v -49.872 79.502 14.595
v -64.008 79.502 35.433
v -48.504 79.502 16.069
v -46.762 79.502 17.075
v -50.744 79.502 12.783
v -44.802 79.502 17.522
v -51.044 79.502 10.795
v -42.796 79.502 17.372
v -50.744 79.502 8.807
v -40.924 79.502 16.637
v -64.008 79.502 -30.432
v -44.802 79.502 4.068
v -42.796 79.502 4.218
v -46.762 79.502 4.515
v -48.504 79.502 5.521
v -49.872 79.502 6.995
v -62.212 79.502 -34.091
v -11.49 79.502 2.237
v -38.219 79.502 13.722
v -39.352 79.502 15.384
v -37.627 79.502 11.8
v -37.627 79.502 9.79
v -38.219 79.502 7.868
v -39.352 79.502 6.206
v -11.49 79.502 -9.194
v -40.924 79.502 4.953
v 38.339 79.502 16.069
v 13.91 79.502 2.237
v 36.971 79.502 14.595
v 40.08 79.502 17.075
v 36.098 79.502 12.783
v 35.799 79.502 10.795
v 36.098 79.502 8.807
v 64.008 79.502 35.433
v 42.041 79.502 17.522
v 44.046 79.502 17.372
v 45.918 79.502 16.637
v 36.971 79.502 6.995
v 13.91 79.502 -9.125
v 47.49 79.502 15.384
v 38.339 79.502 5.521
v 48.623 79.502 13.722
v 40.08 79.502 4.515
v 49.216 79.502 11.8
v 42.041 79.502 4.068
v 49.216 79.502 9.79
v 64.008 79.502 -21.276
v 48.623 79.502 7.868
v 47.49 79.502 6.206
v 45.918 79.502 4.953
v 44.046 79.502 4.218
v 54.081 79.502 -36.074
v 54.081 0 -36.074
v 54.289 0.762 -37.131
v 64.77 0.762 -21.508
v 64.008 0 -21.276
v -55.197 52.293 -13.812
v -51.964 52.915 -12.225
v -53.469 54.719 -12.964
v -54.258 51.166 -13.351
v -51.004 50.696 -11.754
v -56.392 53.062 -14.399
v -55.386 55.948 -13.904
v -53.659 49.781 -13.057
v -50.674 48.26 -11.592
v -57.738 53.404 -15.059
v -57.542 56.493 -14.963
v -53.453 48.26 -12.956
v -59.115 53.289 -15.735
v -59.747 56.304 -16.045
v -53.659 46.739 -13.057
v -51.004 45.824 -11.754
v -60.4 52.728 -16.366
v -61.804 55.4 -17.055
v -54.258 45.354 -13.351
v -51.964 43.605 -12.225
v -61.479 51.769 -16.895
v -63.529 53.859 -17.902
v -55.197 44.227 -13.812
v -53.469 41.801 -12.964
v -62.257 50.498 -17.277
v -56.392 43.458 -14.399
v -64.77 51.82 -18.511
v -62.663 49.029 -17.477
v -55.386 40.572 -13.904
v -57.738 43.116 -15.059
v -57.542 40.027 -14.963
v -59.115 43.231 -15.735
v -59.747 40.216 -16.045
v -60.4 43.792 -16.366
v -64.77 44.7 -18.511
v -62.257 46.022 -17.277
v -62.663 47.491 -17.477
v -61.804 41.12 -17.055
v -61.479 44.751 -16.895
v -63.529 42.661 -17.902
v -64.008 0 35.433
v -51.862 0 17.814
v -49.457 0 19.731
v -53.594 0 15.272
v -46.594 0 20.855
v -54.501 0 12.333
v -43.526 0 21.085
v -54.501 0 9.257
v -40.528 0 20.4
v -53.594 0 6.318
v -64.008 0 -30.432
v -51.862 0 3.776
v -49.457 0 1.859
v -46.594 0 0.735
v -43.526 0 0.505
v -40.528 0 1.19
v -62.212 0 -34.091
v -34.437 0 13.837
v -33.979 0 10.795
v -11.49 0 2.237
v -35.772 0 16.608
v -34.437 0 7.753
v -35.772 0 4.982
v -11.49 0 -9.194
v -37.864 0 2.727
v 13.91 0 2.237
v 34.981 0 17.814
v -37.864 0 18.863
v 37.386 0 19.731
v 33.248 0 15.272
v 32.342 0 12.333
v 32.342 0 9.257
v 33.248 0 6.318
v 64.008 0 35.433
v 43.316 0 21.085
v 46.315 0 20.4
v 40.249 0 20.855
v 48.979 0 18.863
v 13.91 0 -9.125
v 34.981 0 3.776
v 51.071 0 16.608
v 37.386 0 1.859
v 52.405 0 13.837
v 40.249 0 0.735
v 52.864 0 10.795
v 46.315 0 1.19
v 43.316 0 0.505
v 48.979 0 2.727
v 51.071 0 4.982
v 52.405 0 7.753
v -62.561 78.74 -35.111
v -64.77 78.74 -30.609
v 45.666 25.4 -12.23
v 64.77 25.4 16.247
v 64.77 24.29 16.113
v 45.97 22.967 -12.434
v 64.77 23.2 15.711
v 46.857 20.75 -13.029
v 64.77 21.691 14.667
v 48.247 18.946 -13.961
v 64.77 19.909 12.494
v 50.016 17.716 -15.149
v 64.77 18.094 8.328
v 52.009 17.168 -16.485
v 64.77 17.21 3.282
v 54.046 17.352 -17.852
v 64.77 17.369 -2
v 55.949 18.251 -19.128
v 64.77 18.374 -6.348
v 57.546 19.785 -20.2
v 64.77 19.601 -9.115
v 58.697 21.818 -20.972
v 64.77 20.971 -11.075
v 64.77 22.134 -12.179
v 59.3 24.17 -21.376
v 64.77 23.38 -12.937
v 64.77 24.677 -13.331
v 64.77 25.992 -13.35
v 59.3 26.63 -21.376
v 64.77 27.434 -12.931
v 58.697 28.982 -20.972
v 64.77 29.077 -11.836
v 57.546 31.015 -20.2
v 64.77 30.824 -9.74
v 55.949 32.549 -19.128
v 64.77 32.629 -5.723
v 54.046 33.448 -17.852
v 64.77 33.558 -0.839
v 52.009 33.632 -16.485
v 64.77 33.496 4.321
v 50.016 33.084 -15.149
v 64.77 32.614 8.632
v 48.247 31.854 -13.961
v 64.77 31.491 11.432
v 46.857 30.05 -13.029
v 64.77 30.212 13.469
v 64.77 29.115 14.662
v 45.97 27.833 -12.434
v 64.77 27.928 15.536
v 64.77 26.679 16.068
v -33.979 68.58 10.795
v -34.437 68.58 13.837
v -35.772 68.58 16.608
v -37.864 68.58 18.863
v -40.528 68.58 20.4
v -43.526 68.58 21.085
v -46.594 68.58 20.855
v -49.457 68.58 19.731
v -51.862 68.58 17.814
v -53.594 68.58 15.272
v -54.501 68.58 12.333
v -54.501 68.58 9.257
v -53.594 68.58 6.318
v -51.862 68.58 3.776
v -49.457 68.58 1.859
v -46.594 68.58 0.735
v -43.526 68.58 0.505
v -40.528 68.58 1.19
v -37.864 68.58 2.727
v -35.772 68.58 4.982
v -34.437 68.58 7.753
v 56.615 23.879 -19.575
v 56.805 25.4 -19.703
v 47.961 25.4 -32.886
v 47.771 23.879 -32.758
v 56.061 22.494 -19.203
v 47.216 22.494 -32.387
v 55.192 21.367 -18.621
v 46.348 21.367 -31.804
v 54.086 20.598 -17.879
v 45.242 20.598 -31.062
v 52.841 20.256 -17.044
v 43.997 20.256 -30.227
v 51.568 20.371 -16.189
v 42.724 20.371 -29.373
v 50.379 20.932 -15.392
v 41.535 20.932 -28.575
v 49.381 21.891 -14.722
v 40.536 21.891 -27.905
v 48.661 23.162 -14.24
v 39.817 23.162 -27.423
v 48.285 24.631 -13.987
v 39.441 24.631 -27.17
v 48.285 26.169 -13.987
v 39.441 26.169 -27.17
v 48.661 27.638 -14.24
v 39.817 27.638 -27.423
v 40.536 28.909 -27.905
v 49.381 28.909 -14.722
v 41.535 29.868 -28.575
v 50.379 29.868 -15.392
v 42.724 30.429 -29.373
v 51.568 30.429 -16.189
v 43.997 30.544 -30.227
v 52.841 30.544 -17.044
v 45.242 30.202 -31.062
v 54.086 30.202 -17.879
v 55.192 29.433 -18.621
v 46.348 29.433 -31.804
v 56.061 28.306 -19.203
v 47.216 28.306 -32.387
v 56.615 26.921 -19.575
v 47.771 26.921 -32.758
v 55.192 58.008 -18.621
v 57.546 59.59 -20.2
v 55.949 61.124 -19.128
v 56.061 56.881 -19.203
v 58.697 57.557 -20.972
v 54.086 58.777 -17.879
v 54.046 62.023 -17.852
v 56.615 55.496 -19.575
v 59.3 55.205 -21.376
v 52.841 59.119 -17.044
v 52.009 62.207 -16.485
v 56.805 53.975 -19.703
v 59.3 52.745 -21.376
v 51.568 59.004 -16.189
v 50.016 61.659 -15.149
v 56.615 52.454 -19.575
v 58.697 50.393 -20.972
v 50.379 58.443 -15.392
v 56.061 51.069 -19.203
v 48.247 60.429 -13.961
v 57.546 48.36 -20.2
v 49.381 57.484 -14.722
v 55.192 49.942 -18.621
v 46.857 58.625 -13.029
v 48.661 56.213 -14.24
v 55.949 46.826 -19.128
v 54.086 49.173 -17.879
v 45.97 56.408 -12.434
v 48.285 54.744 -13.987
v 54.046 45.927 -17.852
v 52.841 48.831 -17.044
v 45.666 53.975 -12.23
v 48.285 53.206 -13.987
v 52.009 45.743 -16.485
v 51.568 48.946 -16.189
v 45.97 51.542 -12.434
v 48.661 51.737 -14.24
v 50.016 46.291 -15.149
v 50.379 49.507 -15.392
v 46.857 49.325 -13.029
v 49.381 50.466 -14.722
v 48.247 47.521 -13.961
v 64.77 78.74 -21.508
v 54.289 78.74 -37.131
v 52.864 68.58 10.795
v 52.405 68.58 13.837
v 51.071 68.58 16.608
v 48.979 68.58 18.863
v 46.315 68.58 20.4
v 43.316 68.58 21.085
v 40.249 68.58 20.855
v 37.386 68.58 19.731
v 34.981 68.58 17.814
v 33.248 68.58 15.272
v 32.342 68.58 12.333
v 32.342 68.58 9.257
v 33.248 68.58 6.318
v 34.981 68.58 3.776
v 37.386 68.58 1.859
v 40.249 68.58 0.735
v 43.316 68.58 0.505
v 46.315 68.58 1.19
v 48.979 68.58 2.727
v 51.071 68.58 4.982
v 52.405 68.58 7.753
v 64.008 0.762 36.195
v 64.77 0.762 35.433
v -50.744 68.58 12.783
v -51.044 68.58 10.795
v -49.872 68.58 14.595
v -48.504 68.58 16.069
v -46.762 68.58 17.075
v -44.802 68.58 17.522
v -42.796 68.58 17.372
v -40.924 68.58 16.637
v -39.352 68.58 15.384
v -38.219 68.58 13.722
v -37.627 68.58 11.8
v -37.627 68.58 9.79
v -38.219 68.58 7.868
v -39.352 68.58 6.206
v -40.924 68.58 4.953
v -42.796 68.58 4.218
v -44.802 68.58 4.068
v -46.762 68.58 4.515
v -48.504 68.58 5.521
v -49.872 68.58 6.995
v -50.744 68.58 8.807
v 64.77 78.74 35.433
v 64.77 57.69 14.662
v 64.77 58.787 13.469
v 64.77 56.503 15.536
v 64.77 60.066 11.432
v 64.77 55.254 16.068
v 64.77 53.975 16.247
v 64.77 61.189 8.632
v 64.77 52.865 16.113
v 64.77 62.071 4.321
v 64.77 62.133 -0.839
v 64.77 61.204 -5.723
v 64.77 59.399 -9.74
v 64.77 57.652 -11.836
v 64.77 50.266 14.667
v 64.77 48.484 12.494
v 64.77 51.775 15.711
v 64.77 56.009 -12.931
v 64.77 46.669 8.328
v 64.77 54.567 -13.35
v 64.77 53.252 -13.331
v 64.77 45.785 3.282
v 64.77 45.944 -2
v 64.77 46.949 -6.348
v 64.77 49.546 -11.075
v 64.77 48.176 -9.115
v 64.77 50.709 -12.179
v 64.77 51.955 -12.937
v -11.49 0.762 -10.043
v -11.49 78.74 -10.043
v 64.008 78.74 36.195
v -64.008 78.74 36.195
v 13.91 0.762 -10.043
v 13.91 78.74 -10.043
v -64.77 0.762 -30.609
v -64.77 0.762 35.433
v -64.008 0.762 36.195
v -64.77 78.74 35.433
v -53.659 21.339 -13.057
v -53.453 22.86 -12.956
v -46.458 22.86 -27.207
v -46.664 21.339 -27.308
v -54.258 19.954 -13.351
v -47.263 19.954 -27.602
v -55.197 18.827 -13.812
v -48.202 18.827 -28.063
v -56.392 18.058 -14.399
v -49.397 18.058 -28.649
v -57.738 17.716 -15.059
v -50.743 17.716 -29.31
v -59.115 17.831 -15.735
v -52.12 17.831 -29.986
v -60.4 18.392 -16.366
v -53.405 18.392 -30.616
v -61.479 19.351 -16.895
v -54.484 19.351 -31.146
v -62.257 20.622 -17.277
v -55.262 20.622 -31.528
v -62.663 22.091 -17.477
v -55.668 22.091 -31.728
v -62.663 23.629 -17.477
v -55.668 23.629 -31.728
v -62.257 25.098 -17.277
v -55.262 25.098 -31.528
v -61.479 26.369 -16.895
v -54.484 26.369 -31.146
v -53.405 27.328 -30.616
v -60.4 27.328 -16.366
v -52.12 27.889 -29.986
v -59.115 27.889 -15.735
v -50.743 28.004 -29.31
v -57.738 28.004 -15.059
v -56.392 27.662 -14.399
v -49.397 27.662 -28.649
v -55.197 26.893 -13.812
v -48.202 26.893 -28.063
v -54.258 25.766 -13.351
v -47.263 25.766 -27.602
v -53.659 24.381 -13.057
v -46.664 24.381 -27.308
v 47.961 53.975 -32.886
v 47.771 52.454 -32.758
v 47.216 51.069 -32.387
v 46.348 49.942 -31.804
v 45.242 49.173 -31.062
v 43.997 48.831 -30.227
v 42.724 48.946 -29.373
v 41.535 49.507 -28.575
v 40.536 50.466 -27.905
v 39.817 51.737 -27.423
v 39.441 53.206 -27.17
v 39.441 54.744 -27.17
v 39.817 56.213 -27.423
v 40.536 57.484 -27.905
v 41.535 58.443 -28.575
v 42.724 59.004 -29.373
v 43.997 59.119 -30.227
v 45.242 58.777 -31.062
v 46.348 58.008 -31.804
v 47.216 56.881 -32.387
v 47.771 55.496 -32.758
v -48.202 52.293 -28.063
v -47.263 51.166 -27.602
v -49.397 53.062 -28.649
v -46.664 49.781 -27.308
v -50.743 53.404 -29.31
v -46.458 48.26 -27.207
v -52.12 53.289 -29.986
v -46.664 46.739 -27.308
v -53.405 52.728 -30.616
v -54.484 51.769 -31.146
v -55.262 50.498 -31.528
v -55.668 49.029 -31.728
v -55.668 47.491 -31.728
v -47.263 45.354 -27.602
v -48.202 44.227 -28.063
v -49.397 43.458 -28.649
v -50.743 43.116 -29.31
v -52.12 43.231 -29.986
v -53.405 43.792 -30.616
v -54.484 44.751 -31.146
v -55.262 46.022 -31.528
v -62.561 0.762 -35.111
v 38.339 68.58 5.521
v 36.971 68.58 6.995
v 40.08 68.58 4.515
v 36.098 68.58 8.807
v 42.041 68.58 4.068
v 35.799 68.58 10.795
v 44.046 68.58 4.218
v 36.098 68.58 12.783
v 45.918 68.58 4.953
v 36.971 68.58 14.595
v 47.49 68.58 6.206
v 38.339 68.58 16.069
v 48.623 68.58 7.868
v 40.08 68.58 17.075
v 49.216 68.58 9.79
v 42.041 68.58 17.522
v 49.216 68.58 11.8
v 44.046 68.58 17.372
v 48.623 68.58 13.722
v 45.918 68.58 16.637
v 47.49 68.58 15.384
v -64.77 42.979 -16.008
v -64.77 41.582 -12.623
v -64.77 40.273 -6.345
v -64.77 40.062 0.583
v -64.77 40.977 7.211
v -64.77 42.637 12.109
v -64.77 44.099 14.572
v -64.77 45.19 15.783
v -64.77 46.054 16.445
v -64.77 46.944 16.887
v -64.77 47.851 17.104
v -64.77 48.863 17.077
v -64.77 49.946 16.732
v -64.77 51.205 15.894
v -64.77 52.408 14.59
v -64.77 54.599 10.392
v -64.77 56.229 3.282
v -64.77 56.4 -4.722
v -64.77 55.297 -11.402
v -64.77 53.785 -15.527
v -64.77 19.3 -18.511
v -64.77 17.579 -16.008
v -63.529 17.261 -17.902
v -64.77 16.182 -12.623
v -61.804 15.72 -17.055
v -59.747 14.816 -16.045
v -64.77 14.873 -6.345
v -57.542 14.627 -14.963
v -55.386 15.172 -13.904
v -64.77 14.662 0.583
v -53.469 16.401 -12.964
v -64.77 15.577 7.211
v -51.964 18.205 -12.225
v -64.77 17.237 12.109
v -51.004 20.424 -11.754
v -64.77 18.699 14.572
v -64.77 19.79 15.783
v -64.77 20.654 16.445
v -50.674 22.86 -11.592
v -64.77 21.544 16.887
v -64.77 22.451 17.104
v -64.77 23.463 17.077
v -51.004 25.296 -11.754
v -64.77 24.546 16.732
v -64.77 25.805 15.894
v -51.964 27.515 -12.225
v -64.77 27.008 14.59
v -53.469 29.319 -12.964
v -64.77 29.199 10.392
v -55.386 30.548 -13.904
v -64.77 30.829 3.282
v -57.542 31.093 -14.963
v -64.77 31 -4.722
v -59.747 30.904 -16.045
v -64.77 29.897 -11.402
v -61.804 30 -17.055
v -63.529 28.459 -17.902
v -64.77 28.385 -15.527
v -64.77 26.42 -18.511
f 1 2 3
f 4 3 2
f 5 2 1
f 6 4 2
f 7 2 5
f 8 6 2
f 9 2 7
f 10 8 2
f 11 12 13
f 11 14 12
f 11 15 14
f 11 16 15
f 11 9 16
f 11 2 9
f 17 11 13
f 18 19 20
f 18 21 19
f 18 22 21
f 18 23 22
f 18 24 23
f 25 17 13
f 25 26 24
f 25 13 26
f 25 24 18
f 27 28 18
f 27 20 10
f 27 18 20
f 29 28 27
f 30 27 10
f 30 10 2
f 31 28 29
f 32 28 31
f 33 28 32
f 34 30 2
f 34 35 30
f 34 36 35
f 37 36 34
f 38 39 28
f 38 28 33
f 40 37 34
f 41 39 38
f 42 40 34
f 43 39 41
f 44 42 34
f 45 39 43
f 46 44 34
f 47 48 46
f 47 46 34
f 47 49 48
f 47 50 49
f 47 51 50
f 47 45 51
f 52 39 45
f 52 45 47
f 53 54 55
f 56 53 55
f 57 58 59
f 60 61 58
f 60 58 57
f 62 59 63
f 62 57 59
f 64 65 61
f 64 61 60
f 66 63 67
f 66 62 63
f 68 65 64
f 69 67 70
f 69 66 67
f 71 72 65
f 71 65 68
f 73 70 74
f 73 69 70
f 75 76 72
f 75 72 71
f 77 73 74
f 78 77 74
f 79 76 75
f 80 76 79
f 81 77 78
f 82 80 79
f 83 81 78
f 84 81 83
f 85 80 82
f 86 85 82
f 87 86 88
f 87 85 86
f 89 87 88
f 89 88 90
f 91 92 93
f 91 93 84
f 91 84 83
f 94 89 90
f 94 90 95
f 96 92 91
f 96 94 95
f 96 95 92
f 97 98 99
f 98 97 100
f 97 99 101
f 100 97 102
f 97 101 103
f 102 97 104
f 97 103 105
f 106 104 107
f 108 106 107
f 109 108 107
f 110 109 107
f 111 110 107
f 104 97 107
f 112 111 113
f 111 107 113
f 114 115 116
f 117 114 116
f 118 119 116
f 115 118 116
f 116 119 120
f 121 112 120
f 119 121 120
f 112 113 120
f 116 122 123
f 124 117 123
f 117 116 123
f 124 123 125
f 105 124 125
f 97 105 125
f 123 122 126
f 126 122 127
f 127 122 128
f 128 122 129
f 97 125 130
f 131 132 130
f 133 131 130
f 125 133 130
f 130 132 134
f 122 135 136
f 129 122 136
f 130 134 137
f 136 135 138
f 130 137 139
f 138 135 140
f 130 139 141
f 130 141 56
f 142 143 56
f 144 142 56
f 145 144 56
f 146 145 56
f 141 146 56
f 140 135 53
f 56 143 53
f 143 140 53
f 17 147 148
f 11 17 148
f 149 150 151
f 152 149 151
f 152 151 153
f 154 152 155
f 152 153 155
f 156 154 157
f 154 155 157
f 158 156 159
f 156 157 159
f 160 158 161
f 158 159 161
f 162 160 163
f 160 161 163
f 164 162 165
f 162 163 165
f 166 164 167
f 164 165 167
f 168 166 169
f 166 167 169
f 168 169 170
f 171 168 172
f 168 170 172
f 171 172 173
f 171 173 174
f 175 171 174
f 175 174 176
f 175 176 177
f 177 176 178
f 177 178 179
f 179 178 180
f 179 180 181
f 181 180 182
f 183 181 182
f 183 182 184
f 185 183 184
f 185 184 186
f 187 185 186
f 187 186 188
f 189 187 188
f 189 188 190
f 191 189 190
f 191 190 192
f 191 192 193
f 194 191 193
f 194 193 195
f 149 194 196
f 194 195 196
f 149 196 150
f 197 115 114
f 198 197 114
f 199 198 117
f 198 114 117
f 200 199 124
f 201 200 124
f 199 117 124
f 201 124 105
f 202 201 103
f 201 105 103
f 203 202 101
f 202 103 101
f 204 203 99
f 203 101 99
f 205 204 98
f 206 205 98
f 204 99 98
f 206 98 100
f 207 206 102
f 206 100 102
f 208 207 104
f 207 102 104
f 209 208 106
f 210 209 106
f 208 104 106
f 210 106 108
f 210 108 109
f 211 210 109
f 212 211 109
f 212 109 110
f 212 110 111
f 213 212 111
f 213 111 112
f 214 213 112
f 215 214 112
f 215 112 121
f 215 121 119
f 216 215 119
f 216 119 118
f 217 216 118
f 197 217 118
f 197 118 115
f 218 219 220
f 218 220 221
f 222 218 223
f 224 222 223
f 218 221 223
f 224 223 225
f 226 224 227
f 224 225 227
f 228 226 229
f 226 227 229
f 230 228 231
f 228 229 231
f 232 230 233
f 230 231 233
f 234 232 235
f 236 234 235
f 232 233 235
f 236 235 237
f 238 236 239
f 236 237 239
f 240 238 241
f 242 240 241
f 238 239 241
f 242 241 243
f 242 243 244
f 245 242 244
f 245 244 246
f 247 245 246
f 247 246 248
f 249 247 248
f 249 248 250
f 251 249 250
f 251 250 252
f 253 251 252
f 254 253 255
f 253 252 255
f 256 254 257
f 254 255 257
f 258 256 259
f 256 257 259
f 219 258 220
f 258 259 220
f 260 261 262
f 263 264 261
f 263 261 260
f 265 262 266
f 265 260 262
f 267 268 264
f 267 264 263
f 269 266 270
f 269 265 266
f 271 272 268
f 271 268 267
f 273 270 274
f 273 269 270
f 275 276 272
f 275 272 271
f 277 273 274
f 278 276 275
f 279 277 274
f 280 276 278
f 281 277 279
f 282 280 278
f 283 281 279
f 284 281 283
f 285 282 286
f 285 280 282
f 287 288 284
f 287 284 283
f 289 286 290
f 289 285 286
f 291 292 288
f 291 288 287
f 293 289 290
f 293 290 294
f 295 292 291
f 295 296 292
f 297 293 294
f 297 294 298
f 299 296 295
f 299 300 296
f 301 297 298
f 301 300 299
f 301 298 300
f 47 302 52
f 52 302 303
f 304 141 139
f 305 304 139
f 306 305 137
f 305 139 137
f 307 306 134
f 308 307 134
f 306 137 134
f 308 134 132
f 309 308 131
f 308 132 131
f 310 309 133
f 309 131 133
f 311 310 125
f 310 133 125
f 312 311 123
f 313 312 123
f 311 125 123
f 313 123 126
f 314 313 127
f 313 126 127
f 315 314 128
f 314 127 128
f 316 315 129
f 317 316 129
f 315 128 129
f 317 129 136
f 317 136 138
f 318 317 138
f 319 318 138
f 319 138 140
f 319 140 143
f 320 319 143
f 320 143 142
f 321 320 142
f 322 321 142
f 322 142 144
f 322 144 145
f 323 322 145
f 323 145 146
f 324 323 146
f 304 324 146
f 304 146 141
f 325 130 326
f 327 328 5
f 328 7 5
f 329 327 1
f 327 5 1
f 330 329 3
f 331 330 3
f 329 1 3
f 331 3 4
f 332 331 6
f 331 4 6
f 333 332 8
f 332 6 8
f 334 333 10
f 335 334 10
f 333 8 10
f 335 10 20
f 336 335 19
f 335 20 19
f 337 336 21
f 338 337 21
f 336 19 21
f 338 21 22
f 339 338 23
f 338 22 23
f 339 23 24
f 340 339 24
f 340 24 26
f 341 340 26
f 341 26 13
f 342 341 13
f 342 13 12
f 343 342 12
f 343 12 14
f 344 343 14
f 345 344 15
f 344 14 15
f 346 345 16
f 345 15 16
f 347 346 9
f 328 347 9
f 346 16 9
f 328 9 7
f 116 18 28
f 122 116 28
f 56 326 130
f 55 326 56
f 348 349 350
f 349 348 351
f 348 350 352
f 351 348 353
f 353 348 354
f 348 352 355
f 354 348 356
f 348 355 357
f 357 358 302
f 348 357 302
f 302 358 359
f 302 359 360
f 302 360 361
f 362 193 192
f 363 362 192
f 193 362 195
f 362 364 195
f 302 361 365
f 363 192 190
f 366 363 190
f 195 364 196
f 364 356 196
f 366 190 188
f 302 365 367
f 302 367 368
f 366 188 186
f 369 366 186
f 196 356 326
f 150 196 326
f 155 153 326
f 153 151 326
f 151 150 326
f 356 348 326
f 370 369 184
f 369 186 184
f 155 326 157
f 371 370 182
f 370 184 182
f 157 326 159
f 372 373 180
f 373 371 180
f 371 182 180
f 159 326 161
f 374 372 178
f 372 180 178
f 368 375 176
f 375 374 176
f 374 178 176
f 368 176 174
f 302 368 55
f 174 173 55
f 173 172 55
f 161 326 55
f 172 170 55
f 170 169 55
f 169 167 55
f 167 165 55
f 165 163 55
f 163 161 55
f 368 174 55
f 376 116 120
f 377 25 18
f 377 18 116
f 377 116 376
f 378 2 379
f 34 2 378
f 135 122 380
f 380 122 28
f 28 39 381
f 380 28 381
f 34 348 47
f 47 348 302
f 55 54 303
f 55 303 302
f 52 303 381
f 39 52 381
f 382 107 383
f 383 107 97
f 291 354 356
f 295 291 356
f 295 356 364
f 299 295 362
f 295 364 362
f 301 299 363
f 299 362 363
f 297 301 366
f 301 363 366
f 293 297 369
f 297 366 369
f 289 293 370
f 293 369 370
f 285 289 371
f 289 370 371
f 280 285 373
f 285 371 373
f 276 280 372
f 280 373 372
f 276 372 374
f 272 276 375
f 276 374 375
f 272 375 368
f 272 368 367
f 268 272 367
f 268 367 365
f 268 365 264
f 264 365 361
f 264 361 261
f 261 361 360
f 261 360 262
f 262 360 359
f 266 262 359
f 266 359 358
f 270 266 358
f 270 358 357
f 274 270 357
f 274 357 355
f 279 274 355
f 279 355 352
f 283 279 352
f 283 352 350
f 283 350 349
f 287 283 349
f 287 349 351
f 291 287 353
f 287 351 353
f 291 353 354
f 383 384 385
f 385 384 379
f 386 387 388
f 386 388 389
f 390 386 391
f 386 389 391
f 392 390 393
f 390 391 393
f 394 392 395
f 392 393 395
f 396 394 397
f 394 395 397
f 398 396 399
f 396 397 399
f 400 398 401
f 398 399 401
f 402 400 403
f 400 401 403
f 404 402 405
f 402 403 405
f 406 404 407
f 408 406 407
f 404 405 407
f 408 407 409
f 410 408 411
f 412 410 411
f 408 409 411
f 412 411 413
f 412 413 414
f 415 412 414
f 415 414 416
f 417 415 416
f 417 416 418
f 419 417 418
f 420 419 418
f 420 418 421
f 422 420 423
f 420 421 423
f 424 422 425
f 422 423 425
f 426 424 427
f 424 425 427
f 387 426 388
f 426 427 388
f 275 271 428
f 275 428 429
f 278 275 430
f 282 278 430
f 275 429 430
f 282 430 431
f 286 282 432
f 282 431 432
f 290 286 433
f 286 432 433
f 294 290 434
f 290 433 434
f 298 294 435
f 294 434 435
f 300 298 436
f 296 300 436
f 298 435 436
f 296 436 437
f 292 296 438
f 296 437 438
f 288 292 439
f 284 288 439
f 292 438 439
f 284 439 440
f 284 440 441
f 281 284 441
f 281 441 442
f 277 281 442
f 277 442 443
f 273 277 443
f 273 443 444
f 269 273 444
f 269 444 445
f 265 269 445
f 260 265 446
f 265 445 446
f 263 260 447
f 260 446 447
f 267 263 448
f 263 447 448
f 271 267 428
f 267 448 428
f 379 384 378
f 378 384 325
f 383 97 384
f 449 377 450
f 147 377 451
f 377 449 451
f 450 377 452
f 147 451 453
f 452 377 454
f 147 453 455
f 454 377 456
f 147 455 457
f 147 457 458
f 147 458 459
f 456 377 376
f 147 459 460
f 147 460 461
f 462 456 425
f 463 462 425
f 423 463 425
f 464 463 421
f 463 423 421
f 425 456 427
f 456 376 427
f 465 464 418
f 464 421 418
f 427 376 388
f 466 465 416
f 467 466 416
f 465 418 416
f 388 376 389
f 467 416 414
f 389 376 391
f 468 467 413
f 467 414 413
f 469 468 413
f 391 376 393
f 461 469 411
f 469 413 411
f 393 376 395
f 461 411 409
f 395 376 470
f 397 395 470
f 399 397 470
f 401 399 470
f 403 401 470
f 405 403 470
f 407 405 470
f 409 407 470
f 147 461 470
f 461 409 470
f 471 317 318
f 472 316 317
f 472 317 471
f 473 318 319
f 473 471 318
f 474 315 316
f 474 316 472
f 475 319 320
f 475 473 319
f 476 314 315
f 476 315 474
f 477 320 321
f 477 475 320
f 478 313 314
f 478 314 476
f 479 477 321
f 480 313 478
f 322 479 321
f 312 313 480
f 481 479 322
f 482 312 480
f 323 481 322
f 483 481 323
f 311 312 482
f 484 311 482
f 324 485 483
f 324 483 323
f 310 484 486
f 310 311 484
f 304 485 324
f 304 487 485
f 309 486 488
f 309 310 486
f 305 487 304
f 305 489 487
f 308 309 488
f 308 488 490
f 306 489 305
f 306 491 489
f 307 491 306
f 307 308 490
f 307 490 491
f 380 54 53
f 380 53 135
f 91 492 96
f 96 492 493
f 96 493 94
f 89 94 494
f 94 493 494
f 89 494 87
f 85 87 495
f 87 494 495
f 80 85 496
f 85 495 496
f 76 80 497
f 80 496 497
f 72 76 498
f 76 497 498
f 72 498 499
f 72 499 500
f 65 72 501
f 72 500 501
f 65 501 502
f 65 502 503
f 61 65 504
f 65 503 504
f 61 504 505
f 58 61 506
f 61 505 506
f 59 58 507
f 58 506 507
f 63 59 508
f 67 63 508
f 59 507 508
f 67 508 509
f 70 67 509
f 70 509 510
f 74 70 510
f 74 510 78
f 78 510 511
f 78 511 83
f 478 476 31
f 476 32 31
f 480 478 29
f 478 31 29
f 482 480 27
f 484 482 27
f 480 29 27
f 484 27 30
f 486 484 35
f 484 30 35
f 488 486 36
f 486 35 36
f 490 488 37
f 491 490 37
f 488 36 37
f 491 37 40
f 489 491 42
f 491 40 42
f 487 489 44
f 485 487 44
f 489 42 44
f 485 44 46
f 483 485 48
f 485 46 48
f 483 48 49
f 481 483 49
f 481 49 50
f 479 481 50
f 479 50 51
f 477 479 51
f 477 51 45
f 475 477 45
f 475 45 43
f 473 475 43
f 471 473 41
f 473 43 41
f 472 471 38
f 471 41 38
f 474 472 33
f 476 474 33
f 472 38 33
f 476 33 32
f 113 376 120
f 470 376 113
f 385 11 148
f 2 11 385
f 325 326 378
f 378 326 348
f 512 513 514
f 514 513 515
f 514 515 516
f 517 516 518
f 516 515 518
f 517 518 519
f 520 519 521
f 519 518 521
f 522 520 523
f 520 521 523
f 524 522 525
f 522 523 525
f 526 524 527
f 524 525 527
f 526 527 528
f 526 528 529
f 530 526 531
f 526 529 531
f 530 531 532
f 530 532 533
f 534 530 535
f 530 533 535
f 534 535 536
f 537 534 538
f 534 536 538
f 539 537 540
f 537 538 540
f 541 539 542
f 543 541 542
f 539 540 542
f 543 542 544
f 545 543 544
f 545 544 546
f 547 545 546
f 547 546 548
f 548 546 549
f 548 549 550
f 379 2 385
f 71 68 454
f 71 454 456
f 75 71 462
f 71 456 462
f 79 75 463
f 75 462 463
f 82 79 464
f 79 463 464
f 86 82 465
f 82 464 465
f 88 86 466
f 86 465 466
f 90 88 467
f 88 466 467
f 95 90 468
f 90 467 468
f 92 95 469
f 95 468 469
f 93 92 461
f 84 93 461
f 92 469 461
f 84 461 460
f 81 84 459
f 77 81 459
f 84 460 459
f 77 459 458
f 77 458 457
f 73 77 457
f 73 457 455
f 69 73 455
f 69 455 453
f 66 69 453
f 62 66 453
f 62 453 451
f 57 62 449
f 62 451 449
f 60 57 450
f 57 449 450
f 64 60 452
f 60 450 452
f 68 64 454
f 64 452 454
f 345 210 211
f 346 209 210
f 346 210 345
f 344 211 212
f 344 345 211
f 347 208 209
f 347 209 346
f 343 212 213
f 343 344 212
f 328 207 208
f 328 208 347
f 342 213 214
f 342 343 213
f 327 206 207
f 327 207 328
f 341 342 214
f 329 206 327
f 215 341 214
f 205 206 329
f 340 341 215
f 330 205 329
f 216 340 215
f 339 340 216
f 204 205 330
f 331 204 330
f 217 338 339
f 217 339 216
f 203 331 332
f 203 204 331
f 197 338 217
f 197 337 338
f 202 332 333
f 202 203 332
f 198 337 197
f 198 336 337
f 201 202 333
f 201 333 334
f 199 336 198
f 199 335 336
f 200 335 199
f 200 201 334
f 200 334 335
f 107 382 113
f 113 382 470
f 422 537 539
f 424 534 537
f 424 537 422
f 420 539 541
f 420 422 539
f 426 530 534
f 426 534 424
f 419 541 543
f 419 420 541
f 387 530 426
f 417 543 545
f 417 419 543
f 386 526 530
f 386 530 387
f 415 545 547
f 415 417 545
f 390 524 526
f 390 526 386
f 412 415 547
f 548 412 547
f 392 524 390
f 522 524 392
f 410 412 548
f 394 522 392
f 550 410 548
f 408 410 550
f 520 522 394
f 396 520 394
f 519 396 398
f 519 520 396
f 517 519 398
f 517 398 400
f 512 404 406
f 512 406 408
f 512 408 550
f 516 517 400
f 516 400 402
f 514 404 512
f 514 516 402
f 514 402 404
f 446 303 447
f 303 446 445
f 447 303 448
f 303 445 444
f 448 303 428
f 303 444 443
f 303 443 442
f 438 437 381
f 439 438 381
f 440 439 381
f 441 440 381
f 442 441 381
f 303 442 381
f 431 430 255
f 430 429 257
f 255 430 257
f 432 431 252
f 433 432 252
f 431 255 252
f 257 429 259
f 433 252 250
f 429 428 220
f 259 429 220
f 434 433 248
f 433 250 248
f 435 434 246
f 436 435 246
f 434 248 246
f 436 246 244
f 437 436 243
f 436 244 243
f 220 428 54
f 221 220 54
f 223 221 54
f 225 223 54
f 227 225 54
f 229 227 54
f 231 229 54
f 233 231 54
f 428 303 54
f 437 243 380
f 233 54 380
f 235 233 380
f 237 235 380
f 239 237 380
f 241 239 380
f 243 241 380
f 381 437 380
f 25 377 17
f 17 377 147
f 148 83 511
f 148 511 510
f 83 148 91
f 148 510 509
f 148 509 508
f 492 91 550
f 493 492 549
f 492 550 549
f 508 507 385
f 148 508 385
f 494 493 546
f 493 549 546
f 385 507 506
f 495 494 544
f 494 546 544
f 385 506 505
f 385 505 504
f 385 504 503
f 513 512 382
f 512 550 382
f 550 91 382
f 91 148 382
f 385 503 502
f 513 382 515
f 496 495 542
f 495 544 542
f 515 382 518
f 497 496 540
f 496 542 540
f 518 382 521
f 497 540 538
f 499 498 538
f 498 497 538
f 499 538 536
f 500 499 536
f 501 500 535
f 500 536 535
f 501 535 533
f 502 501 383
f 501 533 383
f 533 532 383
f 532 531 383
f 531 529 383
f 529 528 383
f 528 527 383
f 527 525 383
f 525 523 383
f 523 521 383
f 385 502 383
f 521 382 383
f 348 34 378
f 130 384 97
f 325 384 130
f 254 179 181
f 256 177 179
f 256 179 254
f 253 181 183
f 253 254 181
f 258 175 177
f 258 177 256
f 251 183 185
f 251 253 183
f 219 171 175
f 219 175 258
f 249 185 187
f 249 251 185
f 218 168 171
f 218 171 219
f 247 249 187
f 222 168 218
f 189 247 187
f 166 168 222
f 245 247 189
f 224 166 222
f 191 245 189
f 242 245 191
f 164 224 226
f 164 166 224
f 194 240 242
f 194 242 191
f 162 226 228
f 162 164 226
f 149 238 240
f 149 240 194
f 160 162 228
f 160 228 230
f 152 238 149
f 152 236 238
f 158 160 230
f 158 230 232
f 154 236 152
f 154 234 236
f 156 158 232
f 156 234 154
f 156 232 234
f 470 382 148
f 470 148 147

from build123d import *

# Parameters (mm, degrees)
EXTRUDE1_DEPTH                                   = 79.502
CBORE_FOR_3_8_SOCKET_HEAD_CAP_SCREW1_D           = 10.31748
CBORE_FOR_3_8_SOCKET_HEAD_CAP_SCREW1_CBORE_D     = 16.51
CBORE_FOR_3_8_SOCKET_HEAD_CAP_SCREW1_CBORE_DEPTH = 50.165
CBORE_FOR_3_8_SOCKET_HEAD_CAP_SCREW2_D           = 10.31748
CBORE_FOR_3_8_SOCKET_HEAD_CAP_SCREW2_CBORE_D     = 16.51
CBORE_FOR_3_8_SOCKET_HEAD_CAP_SCREW2_CBORE_DEPTH = 50.165
SKETCH14_W                                       = 25.4
SKETCH14_H                                       = 12.279702398
EXTRUDE2_DEPTH                                   = 80.502
CBORE_FOR_1_2_SOCKET_HEAD_CAP_SCREW1_D           = 13.49248
CBORE_FOR_1_2_SOCKET_HEAD_CAP_SCREW1_CBORE_D     = 20.6375
CBORE_FOR_1_2_SOCKET_HEAD_CAP_SCREW1_CBORE_DEPTH = 68.58
EXTRUDE3_DEPTH                                   = 80.502
CHAMFER1_SIZE                                    = 0.762


with BuildPart() as part:
    # Sketch1 → Extrude1 (new body)
    with BuildSketch(Plane(origin=(0, 0, 0), x_dir=(1, 0, 0), z_dir=(0, 1, 0))):
        Polygon((-64.77, 36.195), (-64.77, -36.195), (64.77, -36.195), (64.77, 44.162668668), (3.17795769, 2.843029897), align=None)
    extrude(amount=EXTRUDE1_DEPTH)

    # CBORE for 3/8 Socket Head Cap Screw1 (through all)
    with Locations(Plane(origin=(-27.357474291, 0, 55.735373351), x_dir=(-0.897690082, 0, -0.440627412), z_dir=(-0.440627412, 0, 0.897690082))):
        with Locations((58.851895807, -48.26), (58.851895807, -22.86)):
            CounterBoreHole(CBORE_FOR_3_8_SOCKET_HEAD_CAP_SCREW1_D / 2, CBORE_FOR_3_8_SOCKET_HEAD_CAP_SCREW1_CBORE_D / 2, CBORE_FOR_3_8_SOCKET_HEAD_CAP_SCREW1_CBORE_DEPTH)

    # CBORE for 3/8 Socket Head Cap Screw2 (through all)
    with Locations(Plane(origin=(36.462488364, 0, 54.351857685), x_dir=(-0.830439574, 0, 0.55710871), z_dir=(0.55710871, 0, 0.830439574))):
        with Locations((-52.990978547, -25.4), (-52.990978547, -53.975)):
            CounterBoreHole(CBORE_FOR_3_8_SOCKET_HEAD_CAP_SCREW2_D / 2, CBORE_FOR_3_8_SOCKET_HEAD_CAP_SCREW2_CBORE_D / 2, CBORE_FOR_3_8_SOCKET_HEAD_CAP_SCREW2_CBORE_DEPTH)

    # Sketch14 → Extrude2 (cut, through all)
    with BuildSketch(Plane(origin=(0, 79.502, 0), x_dir=(1, 0, 0), z_dir=(0, 1, 0))):
        with Locations((1.21000637, 3.902881096)):
            Rectangle(SKETCH14_W, SKETCH14_H)
    extrude(amount=-EXTRUDE2_DEPTH, mode=Mode.SUBTRACT)

    # CBORE for 1/2 Socket Head Cap Screw1 (through all)
    with Locations(Plane.XZ):
        with Locations((-44.2976, 10.795), (42.545, 10.795)):
            CounterBoreHole(CBORE_FOR_1_2_SOCKET_HEAD_CAP_SCREW1_D / 2, CBORE_FOR_1_2_SOCKET_HEAD_CAP_SCREW1_CBORE_D / 2, CBORE_FOR_1_2_SOCKET_HEAD_CAP_SCREW1_CBORE_DEPTH)

    # Sketch17 → Extrude3 (cut, through all)
    with BuildSketch(Plane.XZ):
        Polygon((-64.77, -30.609192285), (-62.560551309, -35.110501375), (-64.77, -36.195), align=None)
        Polygon((64.77, -44.162668668), (54.288806225, -37.131254796), (64.77, -21.507736545), align=None)
    extrude(amount=-EXTRUDE3_DEPTH, mode=Mode.SUBTRACT)

    # Chamfer1
    chamfer1_edges = [part.edges().sort_by_distance(p)[0] for p in [
        (0, 79.502, 36.195),
        (59.529403112, 79.502, -29.319495671),
        (59.529403112, 0, -29.319495671),
        (64.77, 79.502, 7.343631727),
        (-37.025272469, 0, -22.576616835),
        (-37.025272469, 79.502, -22.576616835),
        (64.77, 0, 7.343631727),
        (0, 0, 36.195),
        (-64.77, 0, 2.792903858),
        (-64.77, 79.502, 2.792903858),
        (-63.665275654, 79.502, -32.85984683),
        (64.77, 39.751, 36.195),
        (-63.665275654, 0, -32.85984683),
        (-64.77, 39.751, 36.195),
        (34.099406297, 0, -23.586993546),
        (34.099406297, 79.502, -23.586993546),
    ]]
    chamfer(chamfer1_edges, length=CHAMFER1_SIZE)


solid = part.part
